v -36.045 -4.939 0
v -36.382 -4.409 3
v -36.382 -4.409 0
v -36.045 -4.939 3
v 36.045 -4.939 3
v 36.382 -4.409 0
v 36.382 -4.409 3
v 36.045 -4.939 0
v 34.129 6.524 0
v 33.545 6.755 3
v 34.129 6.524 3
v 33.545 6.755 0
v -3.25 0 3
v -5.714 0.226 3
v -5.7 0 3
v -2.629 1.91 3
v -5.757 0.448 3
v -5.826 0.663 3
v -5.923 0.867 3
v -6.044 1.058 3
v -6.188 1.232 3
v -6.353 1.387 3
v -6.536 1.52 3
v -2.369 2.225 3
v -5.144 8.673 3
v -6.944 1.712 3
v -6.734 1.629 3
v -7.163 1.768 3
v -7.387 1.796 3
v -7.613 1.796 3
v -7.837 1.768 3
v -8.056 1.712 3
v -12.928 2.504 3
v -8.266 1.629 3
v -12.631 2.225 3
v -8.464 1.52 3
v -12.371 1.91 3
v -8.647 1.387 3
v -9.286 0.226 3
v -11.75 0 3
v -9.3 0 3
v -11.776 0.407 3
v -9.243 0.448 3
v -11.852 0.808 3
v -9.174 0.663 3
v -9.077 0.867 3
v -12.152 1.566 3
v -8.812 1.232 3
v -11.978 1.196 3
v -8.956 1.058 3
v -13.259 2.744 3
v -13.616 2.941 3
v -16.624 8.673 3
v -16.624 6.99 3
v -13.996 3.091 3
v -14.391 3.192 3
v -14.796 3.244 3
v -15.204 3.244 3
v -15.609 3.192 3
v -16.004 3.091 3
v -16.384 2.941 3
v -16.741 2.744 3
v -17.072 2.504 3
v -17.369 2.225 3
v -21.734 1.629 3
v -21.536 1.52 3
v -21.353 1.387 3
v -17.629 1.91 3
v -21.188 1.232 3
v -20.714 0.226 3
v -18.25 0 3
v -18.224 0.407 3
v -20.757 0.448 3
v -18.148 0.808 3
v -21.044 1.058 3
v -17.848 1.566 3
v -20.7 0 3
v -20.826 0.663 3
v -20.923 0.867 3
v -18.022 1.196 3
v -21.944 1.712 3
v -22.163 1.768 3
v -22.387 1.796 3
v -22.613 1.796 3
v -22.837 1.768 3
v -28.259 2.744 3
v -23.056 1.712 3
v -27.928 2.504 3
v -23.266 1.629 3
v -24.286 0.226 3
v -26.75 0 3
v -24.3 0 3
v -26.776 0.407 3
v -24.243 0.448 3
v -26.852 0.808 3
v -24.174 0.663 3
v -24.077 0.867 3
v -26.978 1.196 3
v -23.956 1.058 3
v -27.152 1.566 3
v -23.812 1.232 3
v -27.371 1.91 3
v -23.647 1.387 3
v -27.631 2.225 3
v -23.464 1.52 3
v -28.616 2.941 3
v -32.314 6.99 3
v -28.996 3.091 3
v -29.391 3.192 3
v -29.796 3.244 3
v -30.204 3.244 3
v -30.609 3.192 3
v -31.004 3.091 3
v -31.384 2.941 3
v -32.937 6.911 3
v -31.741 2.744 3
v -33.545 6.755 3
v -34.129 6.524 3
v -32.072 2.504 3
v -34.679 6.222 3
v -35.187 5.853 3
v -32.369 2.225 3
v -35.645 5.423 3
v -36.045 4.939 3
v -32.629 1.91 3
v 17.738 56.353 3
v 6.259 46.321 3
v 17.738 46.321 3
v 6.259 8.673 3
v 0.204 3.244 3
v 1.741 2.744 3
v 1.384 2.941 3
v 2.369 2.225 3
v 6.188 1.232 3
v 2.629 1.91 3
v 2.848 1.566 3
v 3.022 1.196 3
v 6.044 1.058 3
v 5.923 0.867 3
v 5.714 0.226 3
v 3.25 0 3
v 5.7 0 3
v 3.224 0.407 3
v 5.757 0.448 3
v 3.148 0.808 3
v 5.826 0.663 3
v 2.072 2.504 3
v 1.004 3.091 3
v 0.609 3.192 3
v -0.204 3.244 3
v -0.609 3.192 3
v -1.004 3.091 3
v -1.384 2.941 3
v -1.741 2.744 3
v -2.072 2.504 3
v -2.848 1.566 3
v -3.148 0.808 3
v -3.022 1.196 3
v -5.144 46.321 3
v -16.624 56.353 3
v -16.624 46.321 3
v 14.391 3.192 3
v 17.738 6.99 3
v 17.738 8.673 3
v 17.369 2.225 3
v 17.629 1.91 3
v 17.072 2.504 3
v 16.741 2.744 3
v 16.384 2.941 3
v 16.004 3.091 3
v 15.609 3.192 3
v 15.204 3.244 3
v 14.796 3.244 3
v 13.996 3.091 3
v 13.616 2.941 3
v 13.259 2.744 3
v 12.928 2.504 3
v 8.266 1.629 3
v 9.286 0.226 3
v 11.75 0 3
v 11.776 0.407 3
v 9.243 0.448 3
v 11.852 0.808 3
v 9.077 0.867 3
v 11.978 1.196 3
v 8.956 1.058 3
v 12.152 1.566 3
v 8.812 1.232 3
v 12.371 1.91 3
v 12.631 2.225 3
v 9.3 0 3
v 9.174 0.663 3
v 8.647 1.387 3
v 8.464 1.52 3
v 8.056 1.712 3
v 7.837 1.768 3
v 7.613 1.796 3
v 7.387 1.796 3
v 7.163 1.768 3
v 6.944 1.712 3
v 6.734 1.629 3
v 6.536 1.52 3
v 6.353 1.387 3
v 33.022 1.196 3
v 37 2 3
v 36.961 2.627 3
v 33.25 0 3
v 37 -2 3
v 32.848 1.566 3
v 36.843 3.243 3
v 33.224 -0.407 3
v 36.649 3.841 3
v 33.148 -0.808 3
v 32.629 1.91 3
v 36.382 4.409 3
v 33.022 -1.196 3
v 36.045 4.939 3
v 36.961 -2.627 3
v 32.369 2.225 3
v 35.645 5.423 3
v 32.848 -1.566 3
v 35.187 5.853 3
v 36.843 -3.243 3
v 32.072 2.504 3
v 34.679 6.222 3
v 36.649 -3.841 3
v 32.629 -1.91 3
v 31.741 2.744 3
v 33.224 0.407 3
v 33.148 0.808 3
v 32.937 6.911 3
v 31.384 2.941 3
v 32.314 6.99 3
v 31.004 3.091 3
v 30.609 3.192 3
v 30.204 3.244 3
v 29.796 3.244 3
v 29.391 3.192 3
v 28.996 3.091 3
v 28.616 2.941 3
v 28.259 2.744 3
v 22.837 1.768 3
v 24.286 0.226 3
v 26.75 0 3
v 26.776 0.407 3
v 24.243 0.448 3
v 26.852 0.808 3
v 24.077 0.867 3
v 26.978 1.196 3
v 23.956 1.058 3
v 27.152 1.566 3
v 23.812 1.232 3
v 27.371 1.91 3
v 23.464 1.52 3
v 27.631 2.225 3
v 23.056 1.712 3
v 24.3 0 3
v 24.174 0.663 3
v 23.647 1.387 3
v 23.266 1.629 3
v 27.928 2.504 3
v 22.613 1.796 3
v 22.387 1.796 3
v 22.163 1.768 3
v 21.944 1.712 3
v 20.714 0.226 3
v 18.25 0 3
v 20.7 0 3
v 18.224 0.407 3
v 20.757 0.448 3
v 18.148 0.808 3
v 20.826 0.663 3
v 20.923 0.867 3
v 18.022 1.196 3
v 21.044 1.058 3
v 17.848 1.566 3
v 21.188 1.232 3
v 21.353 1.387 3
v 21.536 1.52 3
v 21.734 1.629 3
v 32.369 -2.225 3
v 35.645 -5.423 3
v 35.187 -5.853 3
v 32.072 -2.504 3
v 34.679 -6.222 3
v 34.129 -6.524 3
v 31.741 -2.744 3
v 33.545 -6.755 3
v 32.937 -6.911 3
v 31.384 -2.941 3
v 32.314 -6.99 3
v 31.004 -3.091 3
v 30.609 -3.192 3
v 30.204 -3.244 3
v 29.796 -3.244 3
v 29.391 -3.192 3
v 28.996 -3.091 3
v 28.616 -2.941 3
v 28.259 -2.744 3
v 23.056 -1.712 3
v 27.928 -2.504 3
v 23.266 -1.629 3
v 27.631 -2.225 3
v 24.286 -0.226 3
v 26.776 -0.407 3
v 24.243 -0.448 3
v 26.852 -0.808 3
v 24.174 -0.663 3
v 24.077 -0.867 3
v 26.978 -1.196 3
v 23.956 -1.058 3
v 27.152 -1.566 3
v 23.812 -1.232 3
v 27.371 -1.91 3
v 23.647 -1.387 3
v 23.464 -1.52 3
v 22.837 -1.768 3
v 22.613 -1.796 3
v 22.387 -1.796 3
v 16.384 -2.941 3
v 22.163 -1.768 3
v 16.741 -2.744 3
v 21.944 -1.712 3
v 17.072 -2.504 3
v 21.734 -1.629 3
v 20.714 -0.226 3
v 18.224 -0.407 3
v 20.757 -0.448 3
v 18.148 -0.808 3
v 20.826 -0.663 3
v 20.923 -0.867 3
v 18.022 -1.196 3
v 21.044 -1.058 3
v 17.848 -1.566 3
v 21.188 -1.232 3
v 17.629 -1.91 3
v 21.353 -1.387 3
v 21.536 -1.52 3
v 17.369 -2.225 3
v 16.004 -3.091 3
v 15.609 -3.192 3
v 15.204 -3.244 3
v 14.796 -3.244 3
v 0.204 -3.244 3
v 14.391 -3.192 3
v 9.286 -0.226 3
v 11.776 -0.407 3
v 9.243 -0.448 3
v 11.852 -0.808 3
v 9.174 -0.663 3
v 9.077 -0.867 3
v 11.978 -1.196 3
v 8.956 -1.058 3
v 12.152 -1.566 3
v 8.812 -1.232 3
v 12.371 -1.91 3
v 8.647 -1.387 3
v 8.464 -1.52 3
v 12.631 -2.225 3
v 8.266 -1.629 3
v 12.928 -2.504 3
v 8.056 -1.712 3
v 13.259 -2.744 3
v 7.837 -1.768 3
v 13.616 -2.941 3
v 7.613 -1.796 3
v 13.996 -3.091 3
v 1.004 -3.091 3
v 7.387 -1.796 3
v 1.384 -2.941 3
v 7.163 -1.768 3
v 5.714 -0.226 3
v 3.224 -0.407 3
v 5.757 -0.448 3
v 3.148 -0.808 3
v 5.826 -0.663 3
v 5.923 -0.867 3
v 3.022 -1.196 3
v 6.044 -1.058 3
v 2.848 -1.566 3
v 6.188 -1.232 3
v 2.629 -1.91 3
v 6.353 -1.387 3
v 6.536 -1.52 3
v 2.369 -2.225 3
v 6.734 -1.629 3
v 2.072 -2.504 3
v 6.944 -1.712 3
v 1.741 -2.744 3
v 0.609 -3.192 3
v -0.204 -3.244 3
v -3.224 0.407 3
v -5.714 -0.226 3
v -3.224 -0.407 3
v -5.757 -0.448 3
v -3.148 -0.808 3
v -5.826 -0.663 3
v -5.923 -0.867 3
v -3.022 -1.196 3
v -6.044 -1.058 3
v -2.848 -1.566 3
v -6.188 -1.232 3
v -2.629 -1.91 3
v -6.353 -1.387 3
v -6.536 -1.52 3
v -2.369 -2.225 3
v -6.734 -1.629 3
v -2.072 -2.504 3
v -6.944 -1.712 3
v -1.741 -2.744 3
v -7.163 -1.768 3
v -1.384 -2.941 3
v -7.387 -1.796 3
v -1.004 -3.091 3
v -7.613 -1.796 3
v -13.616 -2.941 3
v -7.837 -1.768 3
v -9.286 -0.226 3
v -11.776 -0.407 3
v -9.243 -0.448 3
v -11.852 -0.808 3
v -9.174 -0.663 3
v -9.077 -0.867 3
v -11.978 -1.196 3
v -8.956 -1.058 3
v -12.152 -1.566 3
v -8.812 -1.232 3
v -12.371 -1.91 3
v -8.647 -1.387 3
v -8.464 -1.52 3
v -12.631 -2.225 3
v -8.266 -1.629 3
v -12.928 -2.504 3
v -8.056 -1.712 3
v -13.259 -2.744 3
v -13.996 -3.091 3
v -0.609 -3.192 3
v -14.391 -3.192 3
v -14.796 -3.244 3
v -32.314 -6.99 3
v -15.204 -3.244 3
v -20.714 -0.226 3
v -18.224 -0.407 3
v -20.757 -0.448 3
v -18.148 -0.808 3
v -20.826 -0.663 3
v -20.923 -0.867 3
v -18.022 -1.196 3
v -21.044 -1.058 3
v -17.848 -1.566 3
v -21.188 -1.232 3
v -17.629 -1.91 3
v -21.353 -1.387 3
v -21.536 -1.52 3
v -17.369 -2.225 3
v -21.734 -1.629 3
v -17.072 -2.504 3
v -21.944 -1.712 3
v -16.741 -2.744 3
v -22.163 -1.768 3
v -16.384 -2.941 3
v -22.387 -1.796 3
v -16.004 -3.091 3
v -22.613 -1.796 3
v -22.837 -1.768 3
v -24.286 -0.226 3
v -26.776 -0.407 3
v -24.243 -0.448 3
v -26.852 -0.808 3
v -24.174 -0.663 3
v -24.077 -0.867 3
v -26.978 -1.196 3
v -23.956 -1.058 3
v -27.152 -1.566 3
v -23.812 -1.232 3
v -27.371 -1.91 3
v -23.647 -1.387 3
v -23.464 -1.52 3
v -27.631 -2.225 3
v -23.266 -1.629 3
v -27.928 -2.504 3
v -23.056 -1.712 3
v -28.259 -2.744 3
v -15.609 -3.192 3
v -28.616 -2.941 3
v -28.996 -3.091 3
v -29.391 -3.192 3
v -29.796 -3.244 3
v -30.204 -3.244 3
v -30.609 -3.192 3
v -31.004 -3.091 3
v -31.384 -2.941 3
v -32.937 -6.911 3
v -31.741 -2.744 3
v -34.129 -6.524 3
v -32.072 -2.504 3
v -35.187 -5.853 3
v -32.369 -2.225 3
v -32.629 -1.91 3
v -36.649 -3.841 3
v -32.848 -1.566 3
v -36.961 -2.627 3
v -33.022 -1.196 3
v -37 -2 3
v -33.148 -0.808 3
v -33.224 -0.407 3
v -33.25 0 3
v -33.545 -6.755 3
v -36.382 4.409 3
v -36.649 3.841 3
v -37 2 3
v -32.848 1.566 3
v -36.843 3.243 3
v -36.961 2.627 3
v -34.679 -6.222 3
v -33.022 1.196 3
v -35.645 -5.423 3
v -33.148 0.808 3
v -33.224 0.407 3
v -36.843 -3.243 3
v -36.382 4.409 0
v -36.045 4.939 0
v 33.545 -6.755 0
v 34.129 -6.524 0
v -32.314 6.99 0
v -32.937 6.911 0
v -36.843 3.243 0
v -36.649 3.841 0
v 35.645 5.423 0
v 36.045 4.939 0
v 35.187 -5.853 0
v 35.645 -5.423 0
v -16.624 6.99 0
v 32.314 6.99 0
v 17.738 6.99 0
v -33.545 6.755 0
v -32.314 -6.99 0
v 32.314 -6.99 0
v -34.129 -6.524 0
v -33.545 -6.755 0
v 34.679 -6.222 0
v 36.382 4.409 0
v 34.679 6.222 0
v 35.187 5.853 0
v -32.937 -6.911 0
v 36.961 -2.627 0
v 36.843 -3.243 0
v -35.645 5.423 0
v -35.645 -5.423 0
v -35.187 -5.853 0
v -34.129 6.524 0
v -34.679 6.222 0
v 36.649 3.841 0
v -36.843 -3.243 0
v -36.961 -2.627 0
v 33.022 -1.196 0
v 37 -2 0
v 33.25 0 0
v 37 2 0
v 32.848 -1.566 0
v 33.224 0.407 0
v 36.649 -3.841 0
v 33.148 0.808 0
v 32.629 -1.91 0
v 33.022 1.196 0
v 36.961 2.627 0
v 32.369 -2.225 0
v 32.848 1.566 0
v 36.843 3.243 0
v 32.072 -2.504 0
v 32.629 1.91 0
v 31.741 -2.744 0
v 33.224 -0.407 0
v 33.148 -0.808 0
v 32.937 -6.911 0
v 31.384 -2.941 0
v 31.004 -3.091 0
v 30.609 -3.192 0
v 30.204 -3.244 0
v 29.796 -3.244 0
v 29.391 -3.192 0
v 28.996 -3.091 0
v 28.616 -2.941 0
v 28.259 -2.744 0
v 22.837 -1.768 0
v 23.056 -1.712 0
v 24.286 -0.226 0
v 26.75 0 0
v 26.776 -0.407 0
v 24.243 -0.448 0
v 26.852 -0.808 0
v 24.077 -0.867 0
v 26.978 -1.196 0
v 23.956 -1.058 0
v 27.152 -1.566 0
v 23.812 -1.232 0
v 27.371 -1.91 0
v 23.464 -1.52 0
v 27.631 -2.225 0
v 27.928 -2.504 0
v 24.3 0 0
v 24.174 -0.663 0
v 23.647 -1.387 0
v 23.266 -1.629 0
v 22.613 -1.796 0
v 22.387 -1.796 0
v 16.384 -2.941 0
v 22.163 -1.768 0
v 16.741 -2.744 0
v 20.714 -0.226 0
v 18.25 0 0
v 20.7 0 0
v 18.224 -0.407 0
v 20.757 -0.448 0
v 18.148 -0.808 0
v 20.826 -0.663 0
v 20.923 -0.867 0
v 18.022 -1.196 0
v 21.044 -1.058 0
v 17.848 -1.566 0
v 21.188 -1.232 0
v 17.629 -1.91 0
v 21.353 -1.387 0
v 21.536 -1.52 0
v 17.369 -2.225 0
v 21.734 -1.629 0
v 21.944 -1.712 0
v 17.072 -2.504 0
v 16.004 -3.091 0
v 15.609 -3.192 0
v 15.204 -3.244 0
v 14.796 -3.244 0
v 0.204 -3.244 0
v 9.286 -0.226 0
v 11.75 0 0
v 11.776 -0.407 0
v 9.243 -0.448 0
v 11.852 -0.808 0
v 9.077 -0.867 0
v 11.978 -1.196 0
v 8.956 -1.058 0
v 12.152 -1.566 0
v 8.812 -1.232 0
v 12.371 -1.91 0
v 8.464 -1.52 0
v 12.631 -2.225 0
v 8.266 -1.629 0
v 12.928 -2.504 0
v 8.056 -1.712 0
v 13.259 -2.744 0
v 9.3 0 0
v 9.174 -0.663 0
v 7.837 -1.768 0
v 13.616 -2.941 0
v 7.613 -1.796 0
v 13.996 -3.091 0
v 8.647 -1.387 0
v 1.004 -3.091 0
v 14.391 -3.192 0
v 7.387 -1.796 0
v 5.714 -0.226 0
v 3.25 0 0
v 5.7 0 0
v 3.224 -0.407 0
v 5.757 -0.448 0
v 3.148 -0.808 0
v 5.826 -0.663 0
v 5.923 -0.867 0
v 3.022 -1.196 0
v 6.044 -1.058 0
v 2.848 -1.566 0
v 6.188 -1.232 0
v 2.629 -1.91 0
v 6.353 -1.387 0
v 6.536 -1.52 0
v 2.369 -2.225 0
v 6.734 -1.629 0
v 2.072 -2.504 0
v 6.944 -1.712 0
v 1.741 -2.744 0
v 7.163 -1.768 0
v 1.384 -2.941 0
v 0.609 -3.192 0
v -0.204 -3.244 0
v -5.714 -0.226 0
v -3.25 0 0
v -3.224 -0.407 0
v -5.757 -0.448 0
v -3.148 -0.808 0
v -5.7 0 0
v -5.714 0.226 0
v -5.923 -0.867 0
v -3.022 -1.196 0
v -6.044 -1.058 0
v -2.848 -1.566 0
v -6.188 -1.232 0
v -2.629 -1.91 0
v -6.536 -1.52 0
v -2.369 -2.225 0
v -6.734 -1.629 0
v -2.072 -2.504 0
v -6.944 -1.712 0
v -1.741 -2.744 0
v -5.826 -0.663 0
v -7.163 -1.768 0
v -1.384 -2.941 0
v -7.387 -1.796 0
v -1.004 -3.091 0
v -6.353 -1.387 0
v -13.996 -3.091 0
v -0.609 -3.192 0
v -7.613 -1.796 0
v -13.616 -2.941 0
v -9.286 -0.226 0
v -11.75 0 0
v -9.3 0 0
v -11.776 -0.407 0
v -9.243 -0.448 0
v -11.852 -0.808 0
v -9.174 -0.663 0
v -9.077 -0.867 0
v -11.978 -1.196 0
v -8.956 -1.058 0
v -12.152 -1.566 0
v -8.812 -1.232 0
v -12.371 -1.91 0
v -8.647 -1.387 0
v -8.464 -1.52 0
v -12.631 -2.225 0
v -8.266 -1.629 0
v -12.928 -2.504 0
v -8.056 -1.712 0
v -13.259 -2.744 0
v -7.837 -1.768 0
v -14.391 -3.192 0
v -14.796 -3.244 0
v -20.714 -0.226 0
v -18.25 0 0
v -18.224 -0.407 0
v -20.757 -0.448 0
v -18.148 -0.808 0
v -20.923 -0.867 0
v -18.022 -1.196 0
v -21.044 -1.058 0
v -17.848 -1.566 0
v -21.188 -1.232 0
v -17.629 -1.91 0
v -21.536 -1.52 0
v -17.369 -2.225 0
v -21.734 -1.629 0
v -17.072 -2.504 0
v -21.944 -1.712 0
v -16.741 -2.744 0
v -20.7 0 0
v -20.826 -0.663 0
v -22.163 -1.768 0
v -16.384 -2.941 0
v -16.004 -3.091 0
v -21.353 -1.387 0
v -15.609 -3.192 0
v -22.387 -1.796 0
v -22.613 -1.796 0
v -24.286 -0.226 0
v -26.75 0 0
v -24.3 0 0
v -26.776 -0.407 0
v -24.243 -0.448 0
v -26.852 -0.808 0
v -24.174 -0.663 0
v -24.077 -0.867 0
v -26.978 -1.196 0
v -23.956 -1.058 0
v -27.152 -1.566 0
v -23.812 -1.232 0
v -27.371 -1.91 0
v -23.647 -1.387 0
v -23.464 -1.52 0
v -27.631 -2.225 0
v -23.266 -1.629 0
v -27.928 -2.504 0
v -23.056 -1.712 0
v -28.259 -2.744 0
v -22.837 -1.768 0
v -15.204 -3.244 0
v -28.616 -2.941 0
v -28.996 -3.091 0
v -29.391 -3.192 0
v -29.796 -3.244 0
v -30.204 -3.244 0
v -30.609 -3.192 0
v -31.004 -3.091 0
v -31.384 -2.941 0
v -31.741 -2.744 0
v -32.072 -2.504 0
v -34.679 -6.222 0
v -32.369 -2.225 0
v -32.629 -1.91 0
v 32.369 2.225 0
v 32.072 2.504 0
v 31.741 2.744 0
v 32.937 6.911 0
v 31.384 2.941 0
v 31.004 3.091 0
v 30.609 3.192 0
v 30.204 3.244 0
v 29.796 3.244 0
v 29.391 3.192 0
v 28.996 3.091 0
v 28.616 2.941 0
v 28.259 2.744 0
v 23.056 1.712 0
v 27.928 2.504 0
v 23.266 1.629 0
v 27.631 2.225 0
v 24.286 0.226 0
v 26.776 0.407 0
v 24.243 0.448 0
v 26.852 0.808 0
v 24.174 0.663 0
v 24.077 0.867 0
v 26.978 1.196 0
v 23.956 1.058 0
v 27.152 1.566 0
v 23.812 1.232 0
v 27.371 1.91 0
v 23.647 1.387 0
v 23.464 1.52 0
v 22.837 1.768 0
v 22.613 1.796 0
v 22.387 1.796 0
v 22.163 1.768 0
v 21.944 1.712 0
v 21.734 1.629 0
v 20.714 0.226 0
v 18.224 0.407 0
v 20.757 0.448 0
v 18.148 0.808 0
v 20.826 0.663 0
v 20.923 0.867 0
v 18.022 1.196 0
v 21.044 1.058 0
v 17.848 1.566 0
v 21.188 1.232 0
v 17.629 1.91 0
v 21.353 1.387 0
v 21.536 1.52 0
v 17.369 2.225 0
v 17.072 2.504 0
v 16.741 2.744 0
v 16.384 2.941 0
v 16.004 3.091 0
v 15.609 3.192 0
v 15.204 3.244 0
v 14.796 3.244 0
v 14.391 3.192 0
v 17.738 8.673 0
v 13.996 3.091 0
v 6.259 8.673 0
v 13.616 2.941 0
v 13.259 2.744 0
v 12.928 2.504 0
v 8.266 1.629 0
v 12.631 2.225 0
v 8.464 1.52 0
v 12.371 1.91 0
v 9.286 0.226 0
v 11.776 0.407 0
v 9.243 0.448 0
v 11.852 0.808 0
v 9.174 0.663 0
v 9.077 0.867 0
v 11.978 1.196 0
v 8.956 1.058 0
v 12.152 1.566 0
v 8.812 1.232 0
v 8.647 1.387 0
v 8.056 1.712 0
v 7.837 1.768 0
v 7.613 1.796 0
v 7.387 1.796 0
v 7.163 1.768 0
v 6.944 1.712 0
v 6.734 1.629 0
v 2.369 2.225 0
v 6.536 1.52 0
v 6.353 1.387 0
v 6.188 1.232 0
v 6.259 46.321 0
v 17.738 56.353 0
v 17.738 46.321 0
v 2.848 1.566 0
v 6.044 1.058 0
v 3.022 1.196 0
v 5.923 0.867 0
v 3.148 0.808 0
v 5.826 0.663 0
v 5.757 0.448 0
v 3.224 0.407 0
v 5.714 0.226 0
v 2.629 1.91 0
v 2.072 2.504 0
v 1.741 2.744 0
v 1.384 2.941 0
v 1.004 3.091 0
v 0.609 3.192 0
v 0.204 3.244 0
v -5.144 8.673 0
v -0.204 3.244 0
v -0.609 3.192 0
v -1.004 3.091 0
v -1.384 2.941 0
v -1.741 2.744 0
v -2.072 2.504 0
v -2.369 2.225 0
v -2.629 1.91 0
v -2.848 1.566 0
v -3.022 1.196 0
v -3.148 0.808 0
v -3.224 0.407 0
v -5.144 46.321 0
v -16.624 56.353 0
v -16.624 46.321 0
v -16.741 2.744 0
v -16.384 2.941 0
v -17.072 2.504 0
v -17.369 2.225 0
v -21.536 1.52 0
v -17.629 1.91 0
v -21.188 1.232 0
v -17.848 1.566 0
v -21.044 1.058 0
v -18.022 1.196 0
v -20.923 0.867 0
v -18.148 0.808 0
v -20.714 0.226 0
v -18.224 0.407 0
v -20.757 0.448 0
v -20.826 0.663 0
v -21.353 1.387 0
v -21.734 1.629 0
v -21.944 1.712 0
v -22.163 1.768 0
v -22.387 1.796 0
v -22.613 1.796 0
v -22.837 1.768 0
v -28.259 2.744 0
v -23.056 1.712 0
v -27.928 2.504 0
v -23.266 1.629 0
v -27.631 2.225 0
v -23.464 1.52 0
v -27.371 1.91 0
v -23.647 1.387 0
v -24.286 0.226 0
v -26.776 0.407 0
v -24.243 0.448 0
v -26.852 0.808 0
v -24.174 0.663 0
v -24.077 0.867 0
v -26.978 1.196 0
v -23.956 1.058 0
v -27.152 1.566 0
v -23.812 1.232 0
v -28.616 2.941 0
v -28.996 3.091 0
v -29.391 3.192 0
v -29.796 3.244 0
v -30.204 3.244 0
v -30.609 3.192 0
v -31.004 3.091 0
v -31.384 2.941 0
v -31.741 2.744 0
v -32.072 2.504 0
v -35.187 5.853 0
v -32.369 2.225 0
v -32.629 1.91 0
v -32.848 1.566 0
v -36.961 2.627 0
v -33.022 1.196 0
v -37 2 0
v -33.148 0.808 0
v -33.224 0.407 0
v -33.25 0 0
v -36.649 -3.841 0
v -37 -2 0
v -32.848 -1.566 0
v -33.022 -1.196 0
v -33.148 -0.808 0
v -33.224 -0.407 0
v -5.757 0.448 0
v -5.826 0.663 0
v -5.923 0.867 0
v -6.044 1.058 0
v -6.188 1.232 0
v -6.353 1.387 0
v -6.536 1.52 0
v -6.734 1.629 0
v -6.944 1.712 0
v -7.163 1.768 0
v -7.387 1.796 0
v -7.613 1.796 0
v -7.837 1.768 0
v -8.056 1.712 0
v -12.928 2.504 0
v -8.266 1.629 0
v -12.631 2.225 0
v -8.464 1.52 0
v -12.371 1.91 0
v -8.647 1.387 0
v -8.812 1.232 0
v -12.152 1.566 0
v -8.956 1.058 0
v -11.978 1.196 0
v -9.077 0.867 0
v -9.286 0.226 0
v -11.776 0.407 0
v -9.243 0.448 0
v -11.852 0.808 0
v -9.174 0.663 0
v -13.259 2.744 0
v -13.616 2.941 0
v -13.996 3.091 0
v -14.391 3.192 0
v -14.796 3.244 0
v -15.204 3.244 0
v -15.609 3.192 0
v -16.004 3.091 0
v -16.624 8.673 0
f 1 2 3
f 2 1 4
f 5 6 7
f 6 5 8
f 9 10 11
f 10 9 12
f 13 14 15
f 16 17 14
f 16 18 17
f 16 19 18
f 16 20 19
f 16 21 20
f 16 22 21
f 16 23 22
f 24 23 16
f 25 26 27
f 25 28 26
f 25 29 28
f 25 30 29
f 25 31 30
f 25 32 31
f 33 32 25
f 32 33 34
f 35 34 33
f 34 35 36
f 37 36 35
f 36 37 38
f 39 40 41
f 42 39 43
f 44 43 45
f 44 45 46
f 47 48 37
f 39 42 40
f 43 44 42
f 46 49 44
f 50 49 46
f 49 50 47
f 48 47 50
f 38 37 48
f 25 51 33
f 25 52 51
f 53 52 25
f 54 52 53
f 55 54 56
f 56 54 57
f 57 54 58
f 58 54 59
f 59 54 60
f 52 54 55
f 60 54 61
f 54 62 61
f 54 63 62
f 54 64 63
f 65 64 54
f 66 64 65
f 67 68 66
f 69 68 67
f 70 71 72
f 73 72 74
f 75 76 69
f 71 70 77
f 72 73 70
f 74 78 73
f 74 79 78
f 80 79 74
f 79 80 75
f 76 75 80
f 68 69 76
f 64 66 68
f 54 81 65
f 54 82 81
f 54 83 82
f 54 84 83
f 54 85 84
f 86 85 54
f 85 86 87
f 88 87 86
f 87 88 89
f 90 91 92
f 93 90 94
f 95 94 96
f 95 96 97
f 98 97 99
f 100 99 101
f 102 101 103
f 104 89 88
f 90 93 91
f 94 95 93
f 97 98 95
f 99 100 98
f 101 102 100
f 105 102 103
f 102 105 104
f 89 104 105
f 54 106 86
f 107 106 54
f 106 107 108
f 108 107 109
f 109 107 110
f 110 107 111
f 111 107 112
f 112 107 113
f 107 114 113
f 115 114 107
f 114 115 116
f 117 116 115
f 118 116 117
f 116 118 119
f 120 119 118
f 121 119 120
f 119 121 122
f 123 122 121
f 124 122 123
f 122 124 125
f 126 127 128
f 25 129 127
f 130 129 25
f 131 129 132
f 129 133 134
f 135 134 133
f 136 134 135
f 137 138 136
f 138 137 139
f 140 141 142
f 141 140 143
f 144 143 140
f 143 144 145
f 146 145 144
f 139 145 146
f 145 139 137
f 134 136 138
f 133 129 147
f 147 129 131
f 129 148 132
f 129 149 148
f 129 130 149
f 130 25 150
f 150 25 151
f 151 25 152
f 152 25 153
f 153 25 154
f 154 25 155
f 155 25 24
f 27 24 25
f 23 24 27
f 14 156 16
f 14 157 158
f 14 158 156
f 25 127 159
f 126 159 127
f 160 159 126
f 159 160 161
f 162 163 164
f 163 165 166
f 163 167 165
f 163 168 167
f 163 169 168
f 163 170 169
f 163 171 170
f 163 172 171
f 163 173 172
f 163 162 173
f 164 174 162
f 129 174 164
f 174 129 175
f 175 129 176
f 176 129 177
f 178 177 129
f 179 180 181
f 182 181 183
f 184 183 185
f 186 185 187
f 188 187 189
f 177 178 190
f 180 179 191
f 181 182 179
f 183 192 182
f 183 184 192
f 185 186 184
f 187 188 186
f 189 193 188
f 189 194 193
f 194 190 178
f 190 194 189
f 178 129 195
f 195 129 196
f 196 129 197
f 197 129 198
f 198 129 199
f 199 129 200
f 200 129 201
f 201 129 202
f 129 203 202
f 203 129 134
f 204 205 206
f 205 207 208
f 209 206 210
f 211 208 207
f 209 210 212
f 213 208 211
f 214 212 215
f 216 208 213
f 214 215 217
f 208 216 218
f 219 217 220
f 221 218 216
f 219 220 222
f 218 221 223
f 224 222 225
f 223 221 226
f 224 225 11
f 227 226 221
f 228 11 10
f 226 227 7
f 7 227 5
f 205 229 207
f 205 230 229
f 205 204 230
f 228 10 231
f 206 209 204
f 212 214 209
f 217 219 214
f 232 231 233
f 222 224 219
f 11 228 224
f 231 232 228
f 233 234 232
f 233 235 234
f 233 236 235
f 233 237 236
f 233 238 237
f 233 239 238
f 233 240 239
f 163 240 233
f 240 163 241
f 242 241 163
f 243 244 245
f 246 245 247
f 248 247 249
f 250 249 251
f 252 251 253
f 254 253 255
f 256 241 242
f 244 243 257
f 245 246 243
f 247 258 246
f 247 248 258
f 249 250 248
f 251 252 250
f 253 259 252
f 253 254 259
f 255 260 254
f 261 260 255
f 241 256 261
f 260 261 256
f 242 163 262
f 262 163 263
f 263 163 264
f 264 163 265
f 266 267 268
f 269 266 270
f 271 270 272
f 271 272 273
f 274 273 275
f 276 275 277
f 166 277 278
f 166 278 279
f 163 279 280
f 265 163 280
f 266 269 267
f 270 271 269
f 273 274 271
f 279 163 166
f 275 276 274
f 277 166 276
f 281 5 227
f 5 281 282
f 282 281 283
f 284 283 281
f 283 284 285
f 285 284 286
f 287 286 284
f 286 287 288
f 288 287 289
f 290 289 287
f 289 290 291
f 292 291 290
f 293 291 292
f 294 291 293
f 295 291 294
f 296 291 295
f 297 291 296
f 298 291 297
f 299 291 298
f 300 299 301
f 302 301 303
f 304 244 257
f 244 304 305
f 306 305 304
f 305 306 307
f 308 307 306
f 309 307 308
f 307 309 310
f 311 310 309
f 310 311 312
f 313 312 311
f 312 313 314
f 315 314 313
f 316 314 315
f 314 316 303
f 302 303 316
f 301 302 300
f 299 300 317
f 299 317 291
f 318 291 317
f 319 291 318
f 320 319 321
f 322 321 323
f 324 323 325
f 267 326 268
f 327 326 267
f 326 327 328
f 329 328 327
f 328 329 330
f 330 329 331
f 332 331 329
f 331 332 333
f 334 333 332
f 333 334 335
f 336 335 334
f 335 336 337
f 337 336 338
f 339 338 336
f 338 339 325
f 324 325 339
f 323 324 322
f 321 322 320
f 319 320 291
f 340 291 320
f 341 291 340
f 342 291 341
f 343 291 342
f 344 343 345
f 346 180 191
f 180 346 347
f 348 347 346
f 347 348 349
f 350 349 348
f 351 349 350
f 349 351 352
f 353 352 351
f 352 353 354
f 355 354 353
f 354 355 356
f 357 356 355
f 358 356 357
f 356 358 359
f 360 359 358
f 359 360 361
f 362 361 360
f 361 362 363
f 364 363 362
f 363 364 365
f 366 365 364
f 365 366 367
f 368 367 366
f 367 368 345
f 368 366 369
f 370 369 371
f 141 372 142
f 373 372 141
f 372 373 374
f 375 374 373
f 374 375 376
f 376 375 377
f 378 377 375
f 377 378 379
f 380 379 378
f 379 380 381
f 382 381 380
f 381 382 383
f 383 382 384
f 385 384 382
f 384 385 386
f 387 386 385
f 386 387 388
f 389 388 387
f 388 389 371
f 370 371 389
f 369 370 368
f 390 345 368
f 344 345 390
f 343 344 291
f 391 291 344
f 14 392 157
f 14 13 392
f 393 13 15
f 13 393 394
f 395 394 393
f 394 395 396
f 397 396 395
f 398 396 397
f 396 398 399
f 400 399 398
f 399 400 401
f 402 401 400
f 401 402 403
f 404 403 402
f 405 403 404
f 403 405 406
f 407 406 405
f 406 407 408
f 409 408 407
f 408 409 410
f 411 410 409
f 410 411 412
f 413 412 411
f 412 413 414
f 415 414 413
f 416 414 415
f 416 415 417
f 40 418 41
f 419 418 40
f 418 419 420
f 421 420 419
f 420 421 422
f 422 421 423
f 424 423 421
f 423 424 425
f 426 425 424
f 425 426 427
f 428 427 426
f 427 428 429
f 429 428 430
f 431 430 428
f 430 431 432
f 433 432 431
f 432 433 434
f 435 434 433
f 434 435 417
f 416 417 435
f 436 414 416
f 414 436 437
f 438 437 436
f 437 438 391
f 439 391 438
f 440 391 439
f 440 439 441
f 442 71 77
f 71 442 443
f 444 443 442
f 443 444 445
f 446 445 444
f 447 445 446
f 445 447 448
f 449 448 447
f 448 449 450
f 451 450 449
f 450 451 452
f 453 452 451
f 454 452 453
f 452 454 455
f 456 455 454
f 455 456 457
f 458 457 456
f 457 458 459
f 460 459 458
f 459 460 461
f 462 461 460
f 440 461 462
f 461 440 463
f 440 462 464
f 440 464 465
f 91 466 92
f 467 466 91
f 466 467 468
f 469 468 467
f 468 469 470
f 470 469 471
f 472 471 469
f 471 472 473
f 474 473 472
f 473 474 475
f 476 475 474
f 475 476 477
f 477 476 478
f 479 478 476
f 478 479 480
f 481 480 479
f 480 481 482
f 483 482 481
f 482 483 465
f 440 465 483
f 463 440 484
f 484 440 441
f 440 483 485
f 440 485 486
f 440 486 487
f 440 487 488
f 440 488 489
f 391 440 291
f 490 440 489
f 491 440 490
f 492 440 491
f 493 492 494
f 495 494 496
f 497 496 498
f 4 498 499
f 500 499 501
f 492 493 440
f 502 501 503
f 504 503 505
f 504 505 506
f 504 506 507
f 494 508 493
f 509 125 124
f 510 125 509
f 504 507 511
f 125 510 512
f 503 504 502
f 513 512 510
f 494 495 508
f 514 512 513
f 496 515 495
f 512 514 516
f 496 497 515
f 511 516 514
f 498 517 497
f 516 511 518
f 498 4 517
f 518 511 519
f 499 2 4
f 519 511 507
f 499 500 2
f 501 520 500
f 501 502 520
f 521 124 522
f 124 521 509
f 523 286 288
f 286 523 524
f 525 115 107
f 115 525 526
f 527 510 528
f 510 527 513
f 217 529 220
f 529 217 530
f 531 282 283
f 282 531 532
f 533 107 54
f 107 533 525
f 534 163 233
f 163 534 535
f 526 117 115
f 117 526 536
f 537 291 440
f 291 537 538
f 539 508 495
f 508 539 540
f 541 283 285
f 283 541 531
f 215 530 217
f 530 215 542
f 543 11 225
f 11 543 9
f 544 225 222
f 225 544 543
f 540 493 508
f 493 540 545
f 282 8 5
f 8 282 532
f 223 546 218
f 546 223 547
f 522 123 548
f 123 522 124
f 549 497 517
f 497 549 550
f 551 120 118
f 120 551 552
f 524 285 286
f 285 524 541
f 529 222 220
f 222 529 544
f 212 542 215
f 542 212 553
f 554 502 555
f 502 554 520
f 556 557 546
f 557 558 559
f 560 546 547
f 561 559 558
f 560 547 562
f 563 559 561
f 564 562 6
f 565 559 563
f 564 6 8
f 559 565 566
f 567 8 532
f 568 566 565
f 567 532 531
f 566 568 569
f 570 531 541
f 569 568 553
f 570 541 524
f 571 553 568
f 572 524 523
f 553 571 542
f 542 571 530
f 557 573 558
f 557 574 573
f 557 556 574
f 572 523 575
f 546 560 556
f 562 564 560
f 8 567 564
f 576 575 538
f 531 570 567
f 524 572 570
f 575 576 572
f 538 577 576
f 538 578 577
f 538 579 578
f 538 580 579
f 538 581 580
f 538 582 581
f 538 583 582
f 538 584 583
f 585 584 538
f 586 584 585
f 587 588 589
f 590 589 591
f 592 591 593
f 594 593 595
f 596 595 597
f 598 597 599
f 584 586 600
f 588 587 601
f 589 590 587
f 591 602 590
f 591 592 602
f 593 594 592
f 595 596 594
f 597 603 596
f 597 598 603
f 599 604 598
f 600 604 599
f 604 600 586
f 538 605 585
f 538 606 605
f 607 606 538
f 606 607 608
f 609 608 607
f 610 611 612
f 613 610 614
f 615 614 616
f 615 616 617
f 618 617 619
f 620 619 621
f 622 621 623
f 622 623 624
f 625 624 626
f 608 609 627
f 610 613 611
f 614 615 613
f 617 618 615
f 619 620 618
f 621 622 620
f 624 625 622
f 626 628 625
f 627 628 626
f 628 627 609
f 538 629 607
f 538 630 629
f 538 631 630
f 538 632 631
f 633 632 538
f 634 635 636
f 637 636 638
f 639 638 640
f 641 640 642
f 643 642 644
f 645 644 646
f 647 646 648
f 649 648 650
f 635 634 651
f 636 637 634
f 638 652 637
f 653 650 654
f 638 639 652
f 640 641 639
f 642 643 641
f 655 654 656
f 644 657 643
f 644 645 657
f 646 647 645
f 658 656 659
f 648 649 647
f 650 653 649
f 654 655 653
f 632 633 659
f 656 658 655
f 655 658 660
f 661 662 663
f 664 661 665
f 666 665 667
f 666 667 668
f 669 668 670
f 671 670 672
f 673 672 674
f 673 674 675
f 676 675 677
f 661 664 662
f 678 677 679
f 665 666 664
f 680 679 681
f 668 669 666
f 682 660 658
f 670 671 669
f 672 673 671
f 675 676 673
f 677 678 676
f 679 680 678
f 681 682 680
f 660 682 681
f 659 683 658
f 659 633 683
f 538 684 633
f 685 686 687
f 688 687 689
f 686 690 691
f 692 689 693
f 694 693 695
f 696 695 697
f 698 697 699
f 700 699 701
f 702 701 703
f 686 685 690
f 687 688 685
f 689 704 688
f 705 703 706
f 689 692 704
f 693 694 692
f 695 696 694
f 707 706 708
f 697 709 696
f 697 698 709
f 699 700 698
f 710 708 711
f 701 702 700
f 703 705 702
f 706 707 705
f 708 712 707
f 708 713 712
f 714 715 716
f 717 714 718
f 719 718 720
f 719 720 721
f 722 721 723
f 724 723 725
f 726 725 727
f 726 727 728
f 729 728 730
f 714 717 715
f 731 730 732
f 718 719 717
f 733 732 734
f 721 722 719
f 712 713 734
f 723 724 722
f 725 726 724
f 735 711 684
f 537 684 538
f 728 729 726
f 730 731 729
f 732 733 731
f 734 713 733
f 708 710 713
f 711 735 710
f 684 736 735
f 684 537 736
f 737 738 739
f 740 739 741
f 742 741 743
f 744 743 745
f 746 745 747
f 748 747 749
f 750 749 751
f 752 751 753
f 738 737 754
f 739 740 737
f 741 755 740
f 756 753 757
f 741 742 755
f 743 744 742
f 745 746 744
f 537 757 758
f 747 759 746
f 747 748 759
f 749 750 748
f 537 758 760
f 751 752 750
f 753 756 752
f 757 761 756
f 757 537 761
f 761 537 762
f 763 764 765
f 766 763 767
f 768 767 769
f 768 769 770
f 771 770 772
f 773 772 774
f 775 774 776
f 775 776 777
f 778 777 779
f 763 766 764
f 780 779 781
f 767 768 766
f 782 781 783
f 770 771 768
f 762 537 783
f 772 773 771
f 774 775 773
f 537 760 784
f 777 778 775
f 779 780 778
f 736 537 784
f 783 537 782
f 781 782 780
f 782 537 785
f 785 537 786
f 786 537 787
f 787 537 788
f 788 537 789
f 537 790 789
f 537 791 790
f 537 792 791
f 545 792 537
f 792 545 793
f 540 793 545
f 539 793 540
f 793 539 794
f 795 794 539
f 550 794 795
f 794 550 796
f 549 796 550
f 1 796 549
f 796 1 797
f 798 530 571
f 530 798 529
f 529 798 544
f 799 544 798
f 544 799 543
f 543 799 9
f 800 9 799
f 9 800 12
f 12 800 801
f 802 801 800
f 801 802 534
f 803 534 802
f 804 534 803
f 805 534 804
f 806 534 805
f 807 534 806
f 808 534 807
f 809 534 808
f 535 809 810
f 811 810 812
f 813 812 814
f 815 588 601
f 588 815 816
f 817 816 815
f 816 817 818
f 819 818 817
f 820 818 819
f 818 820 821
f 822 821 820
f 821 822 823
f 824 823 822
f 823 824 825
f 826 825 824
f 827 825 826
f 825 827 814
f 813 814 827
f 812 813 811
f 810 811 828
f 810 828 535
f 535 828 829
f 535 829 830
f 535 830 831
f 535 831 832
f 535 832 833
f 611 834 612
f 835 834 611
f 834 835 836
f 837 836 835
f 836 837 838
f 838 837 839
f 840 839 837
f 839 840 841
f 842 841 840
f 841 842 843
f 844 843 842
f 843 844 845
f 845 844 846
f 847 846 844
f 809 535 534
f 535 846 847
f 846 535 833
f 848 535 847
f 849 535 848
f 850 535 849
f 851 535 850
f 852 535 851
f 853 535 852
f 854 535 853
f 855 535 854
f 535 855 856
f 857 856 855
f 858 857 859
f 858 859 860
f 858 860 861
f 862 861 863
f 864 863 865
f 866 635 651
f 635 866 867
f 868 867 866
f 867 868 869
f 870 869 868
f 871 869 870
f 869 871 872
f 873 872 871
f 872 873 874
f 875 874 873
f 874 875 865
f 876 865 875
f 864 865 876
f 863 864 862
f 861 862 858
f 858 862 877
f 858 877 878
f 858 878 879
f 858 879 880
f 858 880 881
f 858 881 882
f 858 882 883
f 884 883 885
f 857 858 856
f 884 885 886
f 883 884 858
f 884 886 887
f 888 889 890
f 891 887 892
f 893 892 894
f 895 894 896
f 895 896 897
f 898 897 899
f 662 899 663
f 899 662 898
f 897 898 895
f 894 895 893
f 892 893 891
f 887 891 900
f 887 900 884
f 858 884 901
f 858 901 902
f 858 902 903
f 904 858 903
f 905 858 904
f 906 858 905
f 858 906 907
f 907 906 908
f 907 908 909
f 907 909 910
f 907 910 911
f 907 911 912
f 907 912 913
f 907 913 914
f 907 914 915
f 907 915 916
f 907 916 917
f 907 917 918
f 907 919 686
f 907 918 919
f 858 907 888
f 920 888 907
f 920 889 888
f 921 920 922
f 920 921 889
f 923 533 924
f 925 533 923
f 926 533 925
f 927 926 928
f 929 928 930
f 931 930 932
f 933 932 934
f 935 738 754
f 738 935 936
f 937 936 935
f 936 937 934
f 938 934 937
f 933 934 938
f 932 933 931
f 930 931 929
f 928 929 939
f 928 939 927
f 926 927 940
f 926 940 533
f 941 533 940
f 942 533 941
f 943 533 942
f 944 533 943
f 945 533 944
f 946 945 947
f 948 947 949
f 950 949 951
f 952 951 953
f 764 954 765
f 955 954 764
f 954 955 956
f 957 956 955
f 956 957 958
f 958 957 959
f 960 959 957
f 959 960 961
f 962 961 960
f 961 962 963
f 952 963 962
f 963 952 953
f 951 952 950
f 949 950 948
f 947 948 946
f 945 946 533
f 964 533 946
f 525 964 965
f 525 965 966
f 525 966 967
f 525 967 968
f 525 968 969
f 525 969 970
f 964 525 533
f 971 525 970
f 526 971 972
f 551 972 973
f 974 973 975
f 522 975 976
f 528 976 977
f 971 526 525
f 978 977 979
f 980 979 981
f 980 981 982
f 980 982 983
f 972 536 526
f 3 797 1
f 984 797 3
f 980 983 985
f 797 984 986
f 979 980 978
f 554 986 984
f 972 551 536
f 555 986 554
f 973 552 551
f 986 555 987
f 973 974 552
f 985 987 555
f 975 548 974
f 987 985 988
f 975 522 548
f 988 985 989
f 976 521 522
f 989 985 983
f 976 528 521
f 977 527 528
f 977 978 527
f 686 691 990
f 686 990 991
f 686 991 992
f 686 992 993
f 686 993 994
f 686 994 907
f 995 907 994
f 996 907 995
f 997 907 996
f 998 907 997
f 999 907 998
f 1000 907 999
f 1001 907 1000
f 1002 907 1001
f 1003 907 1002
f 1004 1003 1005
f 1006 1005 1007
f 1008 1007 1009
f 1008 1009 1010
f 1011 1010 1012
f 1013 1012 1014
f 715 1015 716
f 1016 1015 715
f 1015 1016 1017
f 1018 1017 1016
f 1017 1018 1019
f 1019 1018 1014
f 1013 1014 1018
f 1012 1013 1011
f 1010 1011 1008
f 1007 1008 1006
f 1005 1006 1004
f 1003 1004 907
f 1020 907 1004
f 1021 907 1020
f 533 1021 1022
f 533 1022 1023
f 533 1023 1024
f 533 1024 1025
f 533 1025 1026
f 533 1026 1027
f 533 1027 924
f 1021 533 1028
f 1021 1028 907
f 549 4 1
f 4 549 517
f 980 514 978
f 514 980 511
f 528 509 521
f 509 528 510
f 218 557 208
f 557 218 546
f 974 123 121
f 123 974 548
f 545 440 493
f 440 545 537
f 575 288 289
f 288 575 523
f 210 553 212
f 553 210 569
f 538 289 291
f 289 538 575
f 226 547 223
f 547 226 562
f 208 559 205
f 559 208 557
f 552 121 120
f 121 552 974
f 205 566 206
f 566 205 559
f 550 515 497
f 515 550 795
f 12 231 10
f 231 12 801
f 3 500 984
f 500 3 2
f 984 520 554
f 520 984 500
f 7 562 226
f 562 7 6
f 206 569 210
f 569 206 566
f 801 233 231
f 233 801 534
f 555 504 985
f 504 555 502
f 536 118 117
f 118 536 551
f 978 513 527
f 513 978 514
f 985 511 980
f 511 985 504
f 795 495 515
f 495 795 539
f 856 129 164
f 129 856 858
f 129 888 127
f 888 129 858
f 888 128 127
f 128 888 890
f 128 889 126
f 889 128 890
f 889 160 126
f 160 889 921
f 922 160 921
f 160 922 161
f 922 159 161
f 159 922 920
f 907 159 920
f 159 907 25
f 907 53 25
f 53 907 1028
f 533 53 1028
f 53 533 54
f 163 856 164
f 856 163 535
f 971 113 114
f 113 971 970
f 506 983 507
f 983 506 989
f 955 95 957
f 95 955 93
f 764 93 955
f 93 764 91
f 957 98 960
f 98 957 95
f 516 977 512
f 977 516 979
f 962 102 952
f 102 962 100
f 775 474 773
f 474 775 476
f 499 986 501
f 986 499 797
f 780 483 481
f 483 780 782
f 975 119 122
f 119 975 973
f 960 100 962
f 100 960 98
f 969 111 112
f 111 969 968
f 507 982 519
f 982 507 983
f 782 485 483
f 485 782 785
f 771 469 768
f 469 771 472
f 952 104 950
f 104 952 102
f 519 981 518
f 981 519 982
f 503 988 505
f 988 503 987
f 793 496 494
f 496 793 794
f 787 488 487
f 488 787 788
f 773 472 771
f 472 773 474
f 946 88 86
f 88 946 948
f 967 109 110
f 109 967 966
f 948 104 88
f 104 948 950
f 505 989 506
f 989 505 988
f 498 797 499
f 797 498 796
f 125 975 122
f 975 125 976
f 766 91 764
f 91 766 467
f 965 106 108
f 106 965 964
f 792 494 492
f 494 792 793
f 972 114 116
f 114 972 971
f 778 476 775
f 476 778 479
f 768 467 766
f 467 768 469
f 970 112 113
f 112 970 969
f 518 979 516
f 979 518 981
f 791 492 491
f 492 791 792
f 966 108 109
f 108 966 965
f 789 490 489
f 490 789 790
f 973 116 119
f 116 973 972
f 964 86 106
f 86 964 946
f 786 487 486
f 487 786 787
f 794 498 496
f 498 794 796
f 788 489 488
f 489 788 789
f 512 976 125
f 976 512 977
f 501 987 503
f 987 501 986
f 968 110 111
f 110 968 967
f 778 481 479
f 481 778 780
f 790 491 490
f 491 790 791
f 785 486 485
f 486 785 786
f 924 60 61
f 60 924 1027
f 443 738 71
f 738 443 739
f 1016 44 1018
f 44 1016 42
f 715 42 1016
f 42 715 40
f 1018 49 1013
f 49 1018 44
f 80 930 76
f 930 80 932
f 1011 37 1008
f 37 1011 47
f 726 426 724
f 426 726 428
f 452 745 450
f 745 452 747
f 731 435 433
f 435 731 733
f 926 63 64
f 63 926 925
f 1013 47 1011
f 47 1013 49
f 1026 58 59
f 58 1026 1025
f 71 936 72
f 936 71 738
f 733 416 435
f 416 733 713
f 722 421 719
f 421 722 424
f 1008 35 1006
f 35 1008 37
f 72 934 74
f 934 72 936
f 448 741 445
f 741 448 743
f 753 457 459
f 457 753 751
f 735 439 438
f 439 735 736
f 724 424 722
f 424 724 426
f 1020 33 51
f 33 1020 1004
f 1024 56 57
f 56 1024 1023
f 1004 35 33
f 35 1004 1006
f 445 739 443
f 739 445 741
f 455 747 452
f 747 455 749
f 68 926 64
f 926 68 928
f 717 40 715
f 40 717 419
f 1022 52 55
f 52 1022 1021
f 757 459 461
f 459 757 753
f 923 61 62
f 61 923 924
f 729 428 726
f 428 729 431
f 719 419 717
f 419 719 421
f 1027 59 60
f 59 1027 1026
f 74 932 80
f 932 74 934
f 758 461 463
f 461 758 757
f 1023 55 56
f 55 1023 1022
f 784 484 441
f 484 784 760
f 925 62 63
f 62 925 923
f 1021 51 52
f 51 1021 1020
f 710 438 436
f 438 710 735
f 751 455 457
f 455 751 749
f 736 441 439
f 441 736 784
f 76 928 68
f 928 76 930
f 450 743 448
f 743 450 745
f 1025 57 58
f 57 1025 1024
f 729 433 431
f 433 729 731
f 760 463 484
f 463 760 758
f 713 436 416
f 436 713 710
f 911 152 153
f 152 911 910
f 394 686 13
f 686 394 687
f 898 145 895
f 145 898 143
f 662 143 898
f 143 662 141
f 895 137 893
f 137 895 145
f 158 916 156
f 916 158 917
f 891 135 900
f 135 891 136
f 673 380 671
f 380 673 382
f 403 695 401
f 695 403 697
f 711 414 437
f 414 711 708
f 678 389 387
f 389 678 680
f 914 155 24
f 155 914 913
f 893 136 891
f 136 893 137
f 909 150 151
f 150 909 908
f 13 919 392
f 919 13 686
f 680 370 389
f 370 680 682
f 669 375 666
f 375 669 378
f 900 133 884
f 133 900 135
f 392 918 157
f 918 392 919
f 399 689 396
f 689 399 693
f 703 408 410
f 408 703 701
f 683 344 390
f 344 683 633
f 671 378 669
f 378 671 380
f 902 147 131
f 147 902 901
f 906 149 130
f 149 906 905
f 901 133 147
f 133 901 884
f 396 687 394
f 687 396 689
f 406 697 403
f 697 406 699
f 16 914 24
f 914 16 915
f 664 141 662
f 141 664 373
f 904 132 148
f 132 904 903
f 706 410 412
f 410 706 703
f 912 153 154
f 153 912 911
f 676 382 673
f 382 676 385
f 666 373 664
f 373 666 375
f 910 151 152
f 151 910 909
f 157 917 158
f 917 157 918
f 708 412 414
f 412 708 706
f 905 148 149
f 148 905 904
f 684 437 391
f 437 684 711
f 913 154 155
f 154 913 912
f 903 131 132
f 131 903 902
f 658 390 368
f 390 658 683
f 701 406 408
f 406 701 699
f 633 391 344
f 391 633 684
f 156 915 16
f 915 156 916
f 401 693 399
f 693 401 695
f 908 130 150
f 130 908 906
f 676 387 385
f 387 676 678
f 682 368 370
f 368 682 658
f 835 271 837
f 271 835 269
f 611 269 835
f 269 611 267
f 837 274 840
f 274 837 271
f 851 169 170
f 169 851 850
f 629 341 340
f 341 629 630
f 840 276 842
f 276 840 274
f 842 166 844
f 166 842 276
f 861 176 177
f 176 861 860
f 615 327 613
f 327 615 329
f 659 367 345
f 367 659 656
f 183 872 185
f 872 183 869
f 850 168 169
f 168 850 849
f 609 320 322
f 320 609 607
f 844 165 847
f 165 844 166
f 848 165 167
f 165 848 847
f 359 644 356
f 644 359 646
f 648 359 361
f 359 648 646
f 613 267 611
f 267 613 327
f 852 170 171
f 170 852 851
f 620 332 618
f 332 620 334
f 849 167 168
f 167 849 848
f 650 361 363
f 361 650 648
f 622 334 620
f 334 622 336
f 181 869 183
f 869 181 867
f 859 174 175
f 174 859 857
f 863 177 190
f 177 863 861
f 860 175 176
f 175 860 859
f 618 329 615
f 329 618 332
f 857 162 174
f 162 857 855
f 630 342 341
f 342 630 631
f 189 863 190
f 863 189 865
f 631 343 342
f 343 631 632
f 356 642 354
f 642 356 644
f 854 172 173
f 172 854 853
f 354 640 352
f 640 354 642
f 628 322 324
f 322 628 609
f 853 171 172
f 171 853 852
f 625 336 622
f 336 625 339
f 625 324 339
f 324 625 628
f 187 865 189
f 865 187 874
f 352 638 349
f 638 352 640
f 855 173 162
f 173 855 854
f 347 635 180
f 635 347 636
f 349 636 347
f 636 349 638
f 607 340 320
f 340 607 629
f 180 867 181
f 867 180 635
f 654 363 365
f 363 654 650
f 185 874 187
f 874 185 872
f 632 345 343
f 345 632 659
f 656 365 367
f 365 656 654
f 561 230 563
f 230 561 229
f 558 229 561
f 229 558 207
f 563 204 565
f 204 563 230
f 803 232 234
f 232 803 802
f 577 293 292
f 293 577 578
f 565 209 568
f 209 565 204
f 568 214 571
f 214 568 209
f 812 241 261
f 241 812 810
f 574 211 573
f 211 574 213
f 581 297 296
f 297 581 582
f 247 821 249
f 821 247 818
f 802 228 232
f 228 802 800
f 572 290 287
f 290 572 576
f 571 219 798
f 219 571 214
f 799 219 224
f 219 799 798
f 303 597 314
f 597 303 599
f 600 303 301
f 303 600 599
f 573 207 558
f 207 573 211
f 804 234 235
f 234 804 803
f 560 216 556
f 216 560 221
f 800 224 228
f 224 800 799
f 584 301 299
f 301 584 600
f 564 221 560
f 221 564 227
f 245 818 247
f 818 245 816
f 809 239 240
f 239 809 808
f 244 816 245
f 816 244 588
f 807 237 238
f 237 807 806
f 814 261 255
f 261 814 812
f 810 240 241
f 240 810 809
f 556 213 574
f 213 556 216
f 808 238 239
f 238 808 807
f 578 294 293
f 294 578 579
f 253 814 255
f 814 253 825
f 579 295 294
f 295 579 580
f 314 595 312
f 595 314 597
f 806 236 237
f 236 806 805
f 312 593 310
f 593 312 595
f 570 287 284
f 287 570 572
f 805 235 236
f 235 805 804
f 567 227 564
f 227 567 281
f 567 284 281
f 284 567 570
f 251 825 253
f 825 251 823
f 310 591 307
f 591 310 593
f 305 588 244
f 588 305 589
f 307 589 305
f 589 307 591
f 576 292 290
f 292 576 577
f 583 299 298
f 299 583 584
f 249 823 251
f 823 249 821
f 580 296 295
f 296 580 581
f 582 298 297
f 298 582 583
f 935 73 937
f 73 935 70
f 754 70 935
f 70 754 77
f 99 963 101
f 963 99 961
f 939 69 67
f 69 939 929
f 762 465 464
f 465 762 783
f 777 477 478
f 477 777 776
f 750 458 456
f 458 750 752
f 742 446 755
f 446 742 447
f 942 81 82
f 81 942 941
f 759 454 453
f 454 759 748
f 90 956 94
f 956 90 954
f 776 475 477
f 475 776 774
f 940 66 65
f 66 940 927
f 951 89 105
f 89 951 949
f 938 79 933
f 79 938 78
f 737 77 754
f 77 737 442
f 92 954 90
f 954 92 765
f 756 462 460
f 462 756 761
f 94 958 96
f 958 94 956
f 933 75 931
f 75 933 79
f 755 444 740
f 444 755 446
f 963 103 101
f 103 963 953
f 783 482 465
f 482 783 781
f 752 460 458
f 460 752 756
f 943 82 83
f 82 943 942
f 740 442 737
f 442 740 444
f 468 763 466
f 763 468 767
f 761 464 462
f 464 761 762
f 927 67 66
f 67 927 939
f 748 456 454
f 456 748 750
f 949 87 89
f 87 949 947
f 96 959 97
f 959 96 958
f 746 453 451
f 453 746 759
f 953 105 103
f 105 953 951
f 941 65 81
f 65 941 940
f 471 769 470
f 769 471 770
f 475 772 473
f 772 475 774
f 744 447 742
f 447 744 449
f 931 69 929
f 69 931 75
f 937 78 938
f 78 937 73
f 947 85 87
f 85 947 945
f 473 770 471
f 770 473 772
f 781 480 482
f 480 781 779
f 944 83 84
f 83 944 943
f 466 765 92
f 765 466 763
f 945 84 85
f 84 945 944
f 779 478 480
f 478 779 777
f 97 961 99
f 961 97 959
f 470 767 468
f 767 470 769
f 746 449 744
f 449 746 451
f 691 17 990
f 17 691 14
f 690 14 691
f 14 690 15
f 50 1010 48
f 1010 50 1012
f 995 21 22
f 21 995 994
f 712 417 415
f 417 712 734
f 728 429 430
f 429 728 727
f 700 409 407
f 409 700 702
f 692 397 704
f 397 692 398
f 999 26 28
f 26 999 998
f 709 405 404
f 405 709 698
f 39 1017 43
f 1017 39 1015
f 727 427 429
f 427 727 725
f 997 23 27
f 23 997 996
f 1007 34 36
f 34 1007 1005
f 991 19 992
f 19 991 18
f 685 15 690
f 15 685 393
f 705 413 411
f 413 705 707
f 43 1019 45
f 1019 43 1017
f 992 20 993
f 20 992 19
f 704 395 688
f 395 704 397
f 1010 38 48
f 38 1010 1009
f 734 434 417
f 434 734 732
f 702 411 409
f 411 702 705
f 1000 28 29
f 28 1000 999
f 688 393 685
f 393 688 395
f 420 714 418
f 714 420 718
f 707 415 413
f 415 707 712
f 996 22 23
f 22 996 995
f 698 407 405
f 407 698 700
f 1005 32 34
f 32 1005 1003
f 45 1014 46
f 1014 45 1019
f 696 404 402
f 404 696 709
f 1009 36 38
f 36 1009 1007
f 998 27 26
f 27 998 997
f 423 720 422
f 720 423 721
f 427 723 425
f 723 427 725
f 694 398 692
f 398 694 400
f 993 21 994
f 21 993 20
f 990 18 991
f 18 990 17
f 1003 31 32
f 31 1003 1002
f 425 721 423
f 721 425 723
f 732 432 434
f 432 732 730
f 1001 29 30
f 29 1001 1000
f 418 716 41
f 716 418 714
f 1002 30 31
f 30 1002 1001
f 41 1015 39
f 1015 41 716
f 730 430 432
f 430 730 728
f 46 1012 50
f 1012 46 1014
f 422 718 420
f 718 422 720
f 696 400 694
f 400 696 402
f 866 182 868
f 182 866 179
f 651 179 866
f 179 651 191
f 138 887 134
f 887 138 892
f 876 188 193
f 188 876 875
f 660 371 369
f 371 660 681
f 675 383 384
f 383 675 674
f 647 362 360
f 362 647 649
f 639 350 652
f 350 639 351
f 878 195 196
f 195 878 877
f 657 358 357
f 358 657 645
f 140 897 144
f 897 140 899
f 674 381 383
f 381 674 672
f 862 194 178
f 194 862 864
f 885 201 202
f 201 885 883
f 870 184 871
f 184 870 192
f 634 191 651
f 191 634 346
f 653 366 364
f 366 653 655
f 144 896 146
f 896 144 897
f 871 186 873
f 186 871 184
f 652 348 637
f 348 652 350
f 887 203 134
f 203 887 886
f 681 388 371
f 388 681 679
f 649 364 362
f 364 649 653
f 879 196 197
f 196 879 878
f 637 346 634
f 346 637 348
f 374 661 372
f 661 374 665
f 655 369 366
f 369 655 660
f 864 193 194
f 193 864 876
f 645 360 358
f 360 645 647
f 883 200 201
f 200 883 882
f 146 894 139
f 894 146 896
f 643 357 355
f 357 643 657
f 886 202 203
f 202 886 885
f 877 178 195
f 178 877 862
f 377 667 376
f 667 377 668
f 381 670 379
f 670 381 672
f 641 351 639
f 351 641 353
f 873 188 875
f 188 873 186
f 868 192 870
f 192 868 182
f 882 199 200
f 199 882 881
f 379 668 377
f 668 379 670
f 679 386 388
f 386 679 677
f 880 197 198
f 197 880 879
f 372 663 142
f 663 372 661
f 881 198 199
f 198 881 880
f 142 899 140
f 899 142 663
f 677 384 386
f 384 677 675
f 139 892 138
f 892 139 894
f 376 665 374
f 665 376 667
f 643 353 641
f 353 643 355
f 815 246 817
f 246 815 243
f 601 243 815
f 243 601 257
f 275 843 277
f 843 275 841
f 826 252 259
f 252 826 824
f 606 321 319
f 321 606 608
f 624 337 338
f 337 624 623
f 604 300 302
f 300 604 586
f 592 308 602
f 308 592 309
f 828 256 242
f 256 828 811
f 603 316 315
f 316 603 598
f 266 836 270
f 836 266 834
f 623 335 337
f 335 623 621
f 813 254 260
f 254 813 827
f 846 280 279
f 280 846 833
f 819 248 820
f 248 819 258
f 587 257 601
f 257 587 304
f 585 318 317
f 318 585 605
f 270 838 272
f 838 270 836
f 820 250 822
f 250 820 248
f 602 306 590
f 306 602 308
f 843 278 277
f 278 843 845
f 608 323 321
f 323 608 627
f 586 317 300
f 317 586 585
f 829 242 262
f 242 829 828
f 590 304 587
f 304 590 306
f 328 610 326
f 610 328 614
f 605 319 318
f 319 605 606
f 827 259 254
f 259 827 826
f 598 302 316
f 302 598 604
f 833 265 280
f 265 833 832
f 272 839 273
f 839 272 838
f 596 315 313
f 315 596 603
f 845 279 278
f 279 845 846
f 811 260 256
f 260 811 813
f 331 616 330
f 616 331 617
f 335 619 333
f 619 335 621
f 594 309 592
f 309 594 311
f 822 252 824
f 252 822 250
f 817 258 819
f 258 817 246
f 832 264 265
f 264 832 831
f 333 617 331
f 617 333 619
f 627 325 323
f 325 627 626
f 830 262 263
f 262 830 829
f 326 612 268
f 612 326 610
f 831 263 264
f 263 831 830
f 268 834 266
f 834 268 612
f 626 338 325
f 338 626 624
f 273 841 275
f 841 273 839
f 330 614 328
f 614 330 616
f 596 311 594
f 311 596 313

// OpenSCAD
$fn = 50;


difference() {
	union() {
		hull() {
			translate(v = [-32.0000000000, 2.0000000000, 0]) {
				cylinder(h = 3, r = 5);
			}
			translate(v = [32.0000000000, 2.0000000000, 0]) {
				cylinder(h = 3, r = 5);
			}
			translate(v = [-32.0000000000, -2.0000000000, 0]) {
				cylinder(h = 3, r = 5);
			}
			translate(v = [32.0000000000, -2.0000000000, 0]) {
				cylinder(h = 3, r = 5);
			}
		}
		translate(v = [0, 55, 0]) {
			linear_extrude(height = 3) {
				text(font = "DejaVu Sans Mono:style=Bold", halign = "center", size = 57.0000000000, text = "I", valign = "top");
			}
		}
	}
	union() {
		translate(v = [-30.0000000000, 0.0000000000, 0]) {
			translate(v = [0, 0, -100]) {
				cylinder(h = 200, r = 3.2500000000);
			}
		}
		translate(v = [-15.0000000000, 0.0000000000, 0]) {
			translate(v = [0, 0, -100]) {
				cylinder(h = 200, r = 3.2500000000);
			}
		}
		translate(v = [0, 0, -100]) {
			cylinder(h = 200, r = 3.2500000000);
		}
		translate(v = [15.0000000000, 0.0000000000, 0]) {
			translate(v = [0, 0, -100]) {
				cylinder(h = 200, r = 3.2500000000);
			}
		}
		translate(v = [30.0000000000, 0.0000000000, 0]) {
			translate(v = [0, 0, -100]) {
				cylinder(h = 200, r = 3.2500000000);
			}
		}
		translate(v = [-30.0000000000, 0.0000000000, 0]) {
			translate(v = [0, 0, -100]) {
				cylinder(h = 200, r = 1.8000000000);
			}
		}
		translate(v = [-22.5000000000, 0.0000000000, 0]) {
			translate(v = [0, 0, -100]) {
				cylinder(h = 200, r = 1.8000000000);
			}
		}
		translate(v = [-15.0000000000, 0.0000000000, 0]) {
			translate(v = [0, 0, -100]) {
				cylinder(h = 200, r = 1.8000000000);
			}
		}
		translate(v = [-7.5000000000, 0.0000000000, 0]) {
			translate(v = [0, 0, -100]) {
				cylinder(h = 200, r = 1.8000000000);
			}
		}
		translate(v = [0, 0, -100]) {
			cylinder(h = 200, r = 1.8000000000);
		}
		translate(v = [7.5000000000, 0.0000000000, 0]) {
			translate(v = [0, 0, -100]) {
				cylinder(h = 200, r = 1.8000000000);
			}
		}
		translate(v = [15.0000000000, 0.0000000000, 0]) {
			translate(v = [0, 0, -100]) {
				cylinder(h = 200, r = 1.8000000000);
			}
		}
		translate(v = [22.5000000000, 0.0000000000, 0]) {
			translate(v = [0, 0, -100]) {
				cylinder(h = 200, r = 1.8000000000);
			}
		}
		translate(v = [30.0000000000, 0.0000000000, 0]) {
			translate(v = [0, 0, -100]) {
				cylinder(h = 200, r = 1.8000000000);
			}
		}
	}
}
